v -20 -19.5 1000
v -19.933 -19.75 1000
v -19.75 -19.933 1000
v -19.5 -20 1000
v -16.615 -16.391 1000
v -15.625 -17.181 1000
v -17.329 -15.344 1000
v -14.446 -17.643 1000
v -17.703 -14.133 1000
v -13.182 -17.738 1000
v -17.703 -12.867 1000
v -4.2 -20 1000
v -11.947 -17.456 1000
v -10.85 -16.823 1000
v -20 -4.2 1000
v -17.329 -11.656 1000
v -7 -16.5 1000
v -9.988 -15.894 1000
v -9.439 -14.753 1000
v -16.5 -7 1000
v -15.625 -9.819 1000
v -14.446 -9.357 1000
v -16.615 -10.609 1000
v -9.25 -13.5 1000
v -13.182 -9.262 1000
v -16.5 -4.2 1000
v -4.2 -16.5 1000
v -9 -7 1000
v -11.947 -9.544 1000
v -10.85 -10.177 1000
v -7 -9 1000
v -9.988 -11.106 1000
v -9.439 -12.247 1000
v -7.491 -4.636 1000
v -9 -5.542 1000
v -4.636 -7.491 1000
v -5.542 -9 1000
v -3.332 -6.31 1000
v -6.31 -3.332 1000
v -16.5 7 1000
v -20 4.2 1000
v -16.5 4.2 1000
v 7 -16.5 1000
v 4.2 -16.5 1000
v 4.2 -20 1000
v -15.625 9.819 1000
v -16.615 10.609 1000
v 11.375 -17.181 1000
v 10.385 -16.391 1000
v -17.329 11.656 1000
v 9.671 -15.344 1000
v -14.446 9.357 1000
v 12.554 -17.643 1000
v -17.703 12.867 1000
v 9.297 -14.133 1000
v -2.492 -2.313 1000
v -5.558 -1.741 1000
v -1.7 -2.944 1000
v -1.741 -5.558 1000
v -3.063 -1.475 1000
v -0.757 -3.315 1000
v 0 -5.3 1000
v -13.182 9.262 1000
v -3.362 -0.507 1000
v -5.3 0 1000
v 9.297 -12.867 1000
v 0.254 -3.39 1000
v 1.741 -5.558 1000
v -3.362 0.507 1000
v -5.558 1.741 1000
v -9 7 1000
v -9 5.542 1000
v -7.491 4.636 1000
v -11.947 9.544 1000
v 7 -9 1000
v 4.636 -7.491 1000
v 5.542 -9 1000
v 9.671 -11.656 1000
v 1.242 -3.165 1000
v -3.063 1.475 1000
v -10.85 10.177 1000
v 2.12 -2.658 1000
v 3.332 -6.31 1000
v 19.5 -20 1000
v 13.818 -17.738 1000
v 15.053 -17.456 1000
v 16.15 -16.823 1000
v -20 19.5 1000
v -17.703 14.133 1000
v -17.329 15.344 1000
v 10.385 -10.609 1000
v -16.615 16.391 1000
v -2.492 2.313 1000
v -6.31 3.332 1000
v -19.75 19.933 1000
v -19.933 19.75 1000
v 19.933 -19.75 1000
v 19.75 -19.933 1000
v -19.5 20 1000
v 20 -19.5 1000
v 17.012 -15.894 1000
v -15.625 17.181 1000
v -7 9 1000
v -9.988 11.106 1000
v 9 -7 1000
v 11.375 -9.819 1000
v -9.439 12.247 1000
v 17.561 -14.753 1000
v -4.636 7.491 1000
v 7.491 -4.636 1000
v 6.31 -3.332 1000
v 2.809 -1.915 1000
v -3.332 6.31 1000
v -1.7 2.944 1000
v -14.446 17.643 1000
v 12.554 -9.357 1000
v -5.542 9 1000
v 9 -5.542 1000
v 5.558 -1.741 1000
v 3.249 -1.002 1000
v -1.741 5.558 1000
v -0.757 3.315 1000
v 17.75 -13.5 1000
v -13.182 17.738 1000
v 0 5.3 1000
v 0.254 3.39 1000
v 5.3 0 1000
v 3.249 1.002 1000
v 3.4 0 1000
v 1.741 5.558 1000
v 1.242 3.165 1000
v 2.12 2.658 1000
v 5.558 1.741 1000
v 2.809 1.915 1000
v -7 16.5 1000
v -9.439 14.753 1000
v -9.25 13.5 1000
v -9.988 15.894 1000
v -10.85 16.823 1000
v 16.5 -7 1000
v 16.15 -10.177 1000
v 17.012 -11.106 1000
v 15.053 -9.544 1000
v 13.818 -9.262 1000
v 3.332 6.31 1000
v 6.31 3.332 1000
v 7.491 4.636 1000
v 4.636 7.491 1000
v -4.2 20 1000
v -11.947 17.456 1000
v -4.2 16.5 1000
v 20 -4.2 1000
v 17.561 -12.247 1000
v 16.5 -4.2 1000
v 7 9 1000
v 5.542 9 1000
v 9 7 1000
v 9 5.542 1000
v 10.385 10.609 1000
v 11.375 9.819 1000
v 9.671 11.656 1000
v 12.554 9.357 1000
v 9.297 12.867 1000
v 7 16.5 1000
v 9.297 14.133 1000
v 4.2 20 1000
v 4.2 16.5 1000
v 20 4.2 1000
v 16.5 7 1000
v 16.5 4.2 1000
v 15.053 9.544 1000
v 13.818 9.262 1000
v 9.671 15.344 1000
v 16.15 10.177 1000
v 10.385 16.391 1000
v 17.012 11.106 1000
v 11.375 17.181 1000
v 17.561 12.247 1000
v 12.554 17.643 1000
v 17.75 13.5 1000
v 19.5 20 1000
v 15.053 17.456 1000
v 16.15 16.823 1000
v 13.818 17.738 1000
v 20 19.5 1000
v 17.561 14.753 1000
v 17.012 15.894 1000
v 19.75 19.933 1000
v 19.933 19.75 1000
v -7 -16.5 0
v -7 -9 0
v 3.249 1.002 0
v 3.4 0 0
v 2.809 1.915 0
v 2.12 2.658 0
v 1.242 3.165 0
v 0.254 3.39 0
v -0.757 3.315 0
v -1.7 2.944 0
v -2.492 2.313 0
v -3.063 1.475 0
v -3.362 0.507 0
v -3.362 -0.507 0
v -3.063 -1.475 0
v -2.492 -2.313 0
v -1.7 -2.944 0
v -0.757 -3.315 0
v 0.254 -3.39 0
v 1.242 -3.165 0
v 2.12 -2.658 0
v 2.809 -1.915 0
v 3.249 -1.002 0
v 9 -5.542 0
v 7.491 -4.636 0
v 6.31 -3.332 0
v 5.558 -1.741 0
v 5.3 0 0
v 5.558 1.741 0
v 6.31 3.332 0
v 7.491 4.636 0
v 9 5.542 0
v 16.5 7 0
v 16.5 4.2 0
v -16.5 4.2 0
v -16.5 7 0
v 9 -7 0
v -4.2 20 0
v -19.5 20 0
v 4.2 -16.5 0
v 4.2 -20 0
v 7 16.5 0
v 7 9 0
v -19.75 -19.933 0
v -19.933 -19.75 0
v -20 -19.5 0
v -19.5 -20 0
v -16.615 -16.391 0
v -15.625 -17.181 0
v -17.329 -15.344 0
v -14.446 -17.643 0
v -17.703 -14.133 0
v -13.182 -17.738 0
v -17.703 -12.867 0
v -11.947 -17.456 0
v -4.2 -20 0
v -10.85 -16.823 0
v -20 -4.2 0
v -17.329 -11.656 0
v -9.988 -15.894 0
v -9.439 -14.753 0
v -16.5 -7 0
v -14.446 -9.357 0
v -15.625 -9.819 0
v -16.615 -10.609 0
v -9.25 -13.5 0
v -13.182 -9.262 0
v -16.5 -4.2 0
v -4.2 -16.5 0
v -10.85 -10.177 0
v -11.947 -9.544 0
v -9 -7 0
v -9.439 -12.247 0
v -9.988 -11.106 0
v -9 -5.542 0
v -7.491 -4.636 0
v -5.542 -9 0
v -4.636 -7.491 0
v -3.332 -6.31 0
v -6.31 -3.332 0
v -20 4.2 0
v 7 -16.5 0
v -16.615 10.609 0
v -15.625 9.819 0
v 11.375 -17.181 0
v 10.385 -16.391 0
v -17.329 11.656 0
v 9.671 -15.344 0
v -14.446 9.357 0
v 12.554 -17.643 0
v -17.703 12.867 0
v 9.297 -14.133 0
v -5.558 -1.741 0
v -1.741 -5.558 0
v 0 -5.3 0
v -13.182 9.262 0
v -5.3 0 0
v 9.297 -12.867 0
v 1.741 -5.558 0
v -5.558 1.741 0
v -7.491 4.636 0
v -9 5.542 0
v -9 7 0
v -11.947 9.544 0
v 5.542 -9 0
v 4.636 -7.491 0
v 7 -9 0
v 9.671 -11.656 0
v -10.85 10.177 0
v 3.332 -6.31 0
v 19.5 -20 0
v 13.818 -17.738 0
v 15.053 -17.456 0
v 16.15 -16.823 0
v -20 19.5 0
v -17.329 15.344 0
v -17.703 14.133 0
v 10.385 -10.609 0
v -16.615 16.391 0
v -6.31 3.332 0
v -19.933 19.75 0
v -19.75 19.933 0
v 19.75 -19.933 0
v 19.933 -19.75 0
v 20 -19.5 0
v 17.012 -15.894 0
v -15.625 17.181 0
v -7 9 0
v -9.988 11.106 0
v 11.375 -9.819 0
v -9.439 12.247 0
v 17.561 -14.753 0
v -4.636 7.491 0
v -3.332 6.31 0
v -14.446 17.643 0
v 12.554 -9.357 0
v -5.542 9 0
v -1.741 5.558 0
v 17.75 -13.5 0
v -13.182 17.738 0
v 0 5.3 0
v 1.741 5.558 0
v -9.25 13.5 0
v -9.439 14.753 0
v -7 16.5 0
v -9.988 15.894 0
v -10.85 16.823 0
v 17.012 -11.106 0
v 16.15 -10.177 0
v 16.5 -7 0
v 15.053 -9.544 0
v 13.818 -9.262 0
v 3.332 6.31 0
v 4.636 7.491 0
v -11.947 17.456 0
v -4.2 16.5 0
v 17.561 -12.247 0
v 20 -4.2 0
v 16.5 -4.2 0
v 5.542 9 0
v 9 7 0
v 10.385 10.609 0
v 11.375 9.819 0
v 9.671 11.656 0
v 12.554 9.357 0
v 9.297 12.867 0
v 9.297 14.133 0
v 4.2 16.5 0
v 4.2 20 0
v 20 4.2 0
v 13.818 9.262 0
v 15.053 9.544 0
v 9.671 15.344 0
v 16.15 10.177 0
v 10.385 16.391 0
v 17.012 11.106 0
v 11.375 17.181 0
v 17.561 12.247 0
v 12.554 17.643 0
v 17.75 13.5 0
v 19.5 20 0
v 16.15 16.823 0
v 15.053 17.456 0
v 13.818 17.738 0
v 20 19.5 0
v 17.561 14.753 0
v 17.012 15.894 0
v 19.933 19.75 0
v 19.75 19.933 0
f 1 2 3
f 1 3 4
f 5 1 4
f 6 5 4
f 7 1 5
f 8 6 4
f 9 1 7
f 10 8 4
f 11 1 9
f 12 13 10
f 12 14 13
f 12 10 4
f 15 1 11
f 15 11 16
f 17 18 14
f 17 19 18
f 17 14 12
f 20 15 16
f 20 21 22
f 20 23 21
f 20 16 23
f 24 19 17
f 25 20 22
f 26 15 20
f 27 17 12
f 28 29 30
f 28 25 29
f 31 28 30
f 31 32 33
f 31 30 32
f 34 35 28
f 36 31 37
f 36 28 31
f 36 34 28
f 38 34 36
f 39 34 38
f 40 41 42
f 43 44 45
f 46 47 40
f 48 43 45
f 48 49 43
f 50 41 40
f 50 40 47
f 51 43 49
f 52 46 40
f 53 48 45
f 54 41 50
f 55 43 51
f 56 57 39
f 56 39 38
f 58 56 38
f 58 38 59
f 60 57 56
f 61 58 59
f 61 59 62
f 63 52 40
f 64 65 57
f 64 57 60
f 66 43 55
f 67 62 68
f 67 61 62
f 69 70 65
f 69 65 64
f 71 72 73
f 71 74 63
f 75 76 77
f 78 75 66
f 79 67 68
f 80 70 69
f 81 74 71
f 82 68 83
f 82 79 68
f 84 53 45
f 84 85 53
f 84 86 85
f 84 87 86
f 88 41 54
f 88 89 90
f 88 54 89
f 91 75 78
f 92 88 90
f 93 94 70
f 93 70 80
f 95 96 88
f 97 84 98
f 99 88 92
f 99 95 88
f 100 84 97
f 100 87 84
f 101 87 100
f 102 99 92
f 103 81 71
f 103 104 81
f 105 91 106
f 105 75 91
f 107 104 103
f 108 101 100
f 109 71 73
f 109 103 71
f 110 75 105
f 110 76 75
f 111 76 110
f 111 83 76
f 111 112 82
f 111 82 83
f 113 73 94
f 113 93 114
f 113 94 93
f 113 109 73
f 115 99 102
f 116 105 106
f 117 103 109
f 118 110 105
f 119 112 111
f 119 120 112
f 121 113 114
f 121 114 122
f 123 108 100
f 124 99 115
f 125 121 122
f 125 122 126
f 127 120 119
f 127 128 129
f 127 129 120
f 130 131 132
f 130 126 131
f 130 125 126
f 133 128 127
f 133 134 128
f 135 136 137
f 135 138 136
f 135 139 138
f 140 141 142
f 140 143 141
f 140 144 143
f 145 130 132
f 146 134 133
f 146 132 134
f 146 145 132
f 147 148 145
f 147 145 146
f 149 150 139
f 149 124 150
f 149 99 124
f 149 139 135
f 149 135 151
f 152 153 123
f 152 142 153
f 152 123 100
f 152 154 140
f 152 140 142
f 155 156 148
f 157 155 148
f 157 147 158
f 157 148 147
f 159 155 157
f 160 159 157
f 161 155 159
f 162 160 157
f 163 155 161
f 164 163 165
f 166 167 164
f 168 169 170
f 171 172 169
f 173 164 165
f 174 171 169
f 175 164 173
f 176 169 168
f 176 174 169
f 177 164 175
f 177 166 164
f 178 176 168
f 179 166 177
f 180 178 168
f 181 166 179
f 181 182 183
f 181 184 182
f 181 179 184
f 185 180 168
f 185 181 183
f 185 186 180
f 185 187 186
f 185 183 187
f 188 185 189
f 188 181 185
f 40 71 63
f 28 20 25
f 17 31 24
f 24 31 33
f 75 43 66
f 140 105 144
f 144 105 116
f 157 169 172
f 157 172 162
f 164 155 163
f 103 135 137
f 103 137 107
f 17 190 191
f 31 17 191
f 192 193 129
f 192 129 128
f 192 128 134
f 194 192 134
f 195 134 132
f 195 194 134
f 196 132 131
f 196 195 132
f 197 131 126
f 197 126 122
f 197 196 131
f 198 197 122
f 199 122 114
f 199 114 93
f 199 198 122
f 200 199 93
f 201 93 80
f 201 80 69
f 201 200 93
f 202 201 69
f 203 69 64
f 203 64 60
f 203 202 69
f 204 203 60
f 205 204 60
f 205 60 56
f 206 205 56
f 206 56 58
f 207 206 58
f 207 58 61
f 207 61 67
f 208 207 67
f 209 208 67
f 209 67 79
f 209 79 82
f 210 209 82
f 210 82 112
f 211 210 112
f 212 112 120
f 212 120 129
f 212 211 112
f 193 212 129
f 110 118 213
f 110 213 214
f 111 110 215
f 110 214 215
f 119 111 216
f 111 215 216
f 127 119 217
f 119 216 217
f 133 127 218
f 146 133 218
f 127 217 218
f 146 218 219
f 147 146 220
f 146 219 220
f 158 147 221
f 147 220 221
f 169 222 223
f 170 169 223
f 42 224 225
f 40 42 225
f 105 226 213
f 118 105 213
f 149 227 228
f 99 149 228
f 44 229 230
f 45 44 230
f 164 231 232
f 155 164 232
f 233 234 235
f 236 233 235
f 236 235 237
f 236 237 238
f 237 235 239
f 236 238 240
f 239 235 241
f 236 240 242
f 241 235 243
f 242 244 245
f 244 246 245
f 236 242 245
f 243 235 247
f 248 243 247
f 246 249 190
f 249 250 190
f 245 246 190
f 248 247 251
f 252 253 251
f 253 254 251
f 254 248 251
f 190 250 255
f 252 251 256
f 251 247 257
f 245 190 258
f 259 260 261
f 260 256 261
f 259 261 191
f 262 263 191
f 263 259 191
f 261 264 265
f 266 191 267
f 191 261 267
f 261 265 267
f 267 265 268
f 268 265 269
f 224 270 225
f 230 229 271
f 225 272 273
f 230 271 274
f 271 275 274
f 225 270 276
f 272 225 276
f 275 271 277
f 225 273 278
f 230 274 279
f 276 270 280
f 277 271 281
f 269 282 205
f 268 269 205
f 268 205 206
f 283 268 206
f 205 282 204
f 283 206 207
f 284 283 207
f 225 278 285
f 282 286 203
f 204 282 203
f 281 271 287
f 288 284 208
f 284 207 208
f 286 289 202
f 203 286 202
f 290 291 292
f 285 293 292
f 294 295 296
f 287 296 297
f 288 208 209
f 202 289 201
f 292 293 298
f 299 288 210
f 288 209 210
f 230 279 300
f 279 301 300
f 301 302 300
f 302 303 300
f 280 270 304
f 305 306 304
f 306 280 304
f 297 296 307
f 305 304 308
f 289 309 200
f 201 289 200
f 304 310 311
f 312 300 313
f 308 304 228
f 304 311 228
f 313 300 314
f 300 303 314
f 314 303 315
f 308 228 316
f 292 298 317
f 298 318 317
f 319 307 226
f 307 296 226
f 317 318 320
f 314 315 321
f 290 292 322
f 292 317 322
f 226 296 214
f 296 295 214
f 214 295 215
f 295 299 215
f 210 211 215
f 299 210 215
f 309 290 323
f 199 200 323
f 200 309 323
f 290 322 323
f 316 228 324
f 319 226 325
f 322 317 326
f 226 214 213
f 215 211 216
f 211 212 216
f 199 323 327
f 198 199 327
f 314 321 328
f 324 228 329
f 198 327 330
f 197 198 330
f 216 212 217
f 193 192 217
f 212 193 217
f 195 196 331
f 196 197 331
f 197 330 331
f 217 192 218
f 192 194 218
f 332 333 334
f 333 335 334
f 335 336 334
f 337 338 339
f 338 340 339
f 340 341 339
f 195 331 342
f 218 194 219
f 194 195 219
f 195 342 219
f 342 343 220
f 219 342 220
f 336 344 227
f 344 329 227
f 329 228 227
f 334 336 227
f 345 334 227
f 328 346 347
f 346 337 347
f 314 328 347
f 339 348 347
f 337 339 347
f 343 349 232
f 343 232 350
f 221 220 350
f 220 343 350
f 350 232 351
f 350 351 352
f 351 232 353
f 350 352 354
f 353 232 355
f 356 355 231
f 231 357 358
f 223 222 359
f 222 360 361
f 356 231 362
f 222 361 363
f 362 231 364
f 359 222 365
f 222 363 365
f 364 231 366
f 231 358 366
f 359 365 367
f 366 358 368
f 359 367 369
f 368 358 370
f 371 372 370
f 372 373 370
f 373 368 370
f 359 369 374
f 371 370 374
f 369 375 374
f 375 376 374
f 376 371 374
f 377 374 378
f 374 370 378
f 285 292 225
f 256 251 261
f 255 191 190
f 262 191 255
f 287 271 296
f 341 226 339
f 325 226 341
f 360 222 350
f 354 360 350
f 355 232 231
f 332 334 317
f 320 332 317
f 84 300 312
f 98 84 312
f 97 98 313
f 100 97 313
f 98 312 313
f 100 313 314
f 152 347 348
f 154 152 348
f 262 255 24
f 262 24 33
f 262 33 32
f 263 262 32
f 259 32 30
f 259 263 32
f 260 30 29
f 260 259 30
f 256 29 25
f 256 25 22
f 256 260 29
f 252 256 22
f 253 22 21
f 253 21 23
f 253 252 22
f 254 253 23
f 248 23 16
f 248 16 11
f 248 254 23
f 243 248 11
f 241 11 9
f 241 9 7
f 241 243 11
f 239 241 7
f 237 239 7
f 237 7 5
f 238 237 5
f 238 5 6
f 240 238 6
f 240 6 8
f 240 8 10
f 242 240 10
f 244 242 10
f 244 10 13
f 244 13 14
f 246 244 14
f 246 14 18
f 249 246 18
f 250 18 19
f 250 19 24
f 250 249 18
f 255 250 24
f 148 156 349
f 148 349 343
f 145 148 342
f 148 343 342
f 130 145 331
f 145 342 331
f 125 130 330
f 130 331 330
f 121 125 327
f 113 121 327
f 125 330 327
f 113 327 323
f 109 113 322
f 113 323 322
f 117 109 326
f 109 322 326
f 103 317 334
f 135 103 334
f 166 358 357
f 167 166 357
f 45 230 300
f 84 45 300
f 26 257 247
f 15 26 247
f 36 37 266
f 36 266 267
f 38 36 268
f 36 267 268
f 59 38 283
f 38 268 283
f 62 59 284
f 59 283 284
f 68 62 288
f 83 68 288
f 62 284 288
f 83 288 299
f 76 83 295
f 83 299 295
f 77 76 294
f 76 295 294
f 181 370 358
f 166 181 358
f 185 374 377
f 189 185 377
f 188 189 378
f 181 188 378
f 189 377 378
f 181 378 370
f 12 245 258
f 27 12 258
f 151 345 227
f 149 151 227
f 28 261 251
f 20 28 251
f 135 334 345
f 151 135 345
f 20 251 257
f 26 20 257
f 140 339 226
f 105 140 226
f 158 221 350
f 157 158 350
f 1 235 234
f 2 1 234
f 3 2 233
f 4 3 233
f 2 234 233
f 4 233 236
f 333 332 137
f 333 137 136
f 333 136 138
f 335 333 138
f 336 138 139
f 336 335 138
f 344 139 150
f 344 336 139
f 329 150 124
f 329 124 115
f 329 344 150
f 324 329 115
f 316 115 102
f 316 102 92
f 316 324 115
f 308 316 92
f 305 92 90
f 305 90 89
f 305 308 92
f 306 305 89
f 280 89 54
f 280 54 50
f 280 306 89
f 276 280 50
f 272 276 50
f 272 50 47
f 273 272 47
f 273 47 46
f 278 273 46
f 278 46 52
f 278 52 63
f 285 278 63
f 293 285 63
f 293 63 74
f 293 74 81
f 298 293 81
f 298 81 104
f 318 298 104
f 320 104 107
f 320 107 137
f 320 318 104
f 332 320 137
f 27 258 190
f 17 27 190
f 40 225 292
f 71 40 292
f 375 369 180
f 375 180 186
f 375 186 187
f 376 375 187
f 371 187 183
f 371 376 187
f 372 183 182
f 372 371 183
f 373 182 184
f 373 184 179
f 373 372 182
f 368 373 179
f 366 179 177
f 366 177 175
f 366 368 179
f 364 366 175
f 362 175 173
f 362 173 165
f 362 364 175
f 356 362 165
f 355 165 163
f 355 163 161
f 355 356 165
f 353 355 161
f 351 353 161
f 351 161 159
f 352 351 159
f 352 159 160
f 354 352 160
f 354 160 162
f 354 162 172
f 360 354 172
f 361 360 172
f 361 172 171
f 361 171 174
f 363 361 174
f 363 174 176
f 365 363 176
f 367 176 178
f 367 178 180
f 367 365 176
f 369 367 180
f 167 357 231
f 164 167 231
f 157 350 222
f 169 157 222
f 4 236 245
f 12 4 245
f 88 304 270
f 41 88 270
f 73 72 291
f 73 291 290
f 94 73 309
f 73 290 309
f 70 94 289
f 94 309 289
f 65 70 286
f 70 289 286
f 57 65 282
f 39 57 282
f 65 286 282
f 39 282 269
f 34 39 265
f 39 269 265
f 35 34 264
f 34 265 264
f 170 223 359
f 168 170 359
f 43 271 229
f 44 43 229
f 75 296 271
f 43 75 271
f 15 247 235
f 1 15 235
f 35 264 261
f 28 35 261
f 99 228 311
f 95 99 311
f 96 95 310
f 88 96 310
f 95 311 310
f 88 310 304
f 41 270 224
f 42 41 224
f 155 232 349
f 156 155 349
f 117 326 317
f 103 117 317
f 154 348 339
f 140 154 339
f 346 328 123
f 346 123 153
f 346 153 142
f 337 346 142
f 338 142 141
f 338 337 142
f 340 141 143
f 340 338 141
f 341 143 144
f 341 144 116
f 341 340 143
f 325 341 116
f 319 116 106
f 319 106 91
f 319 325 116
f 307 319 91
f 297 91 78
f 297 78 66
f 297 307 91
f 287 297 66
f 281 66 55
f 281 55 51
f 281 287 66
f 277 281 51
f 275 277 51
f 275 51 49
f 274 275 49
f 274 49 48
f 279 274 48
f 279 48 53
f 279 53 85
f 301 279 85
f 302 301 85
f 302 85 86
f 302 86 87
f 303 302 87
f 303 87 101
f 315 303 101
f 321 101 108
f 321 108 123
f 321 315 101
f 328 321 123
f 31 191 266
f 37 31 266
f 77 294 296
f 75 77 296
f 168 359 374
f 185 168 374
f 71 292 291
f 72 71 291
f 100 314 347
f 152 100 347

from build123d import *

# Parameters (mm, degrees)
SKETCH_1_R      = 4.25
SKETCH_1_R_2    = 3.4
EXTRUDE_1_DEPTH = 1000


with BuildPart() as part:
    # Эскиз1 → Бобышка-Вытянуть1 (new body)
    with BuildSketch(Plane.XY):
        with BuildLine():
            Line((-20, 19.5), (-20, 7))
            Line((-20, 7), (-20, 4.2))
            Line((-20, 4.2), (-16.5, 4.2))
            Line((-16.5, 4.2), (-16.5, 7))
            Line((-16.5, 7), (-9, 7))
            Line((-9, 7), (-9, 5.541660401))
            ThreePointArc((-9, 5.541660401), (-5.3, 0), (-9, -5.541660401))
            Line((-9, -5.541660401), (-9, -7))
            Line((-9, -7), (-16.5, -7))
            Line((-16.5, -7), (-16.5, -4.2))
            Line((-16.5, -4.2), (-20, -4.2))
            Line((-20, -4.2), (-20, -7))
            Line((-20, -7), (-20, -19.5))
            ThreePointArc((-20, -19.5), (-19.853553391, -19.853553391), (-19.5, -20))
            Line((-19.5, -20), (-7, -20))
            Line((-7, -20), (-4.2, -20))
            Line((-4.2, -20), (-4.2, -16.5))
            Line((-4.2, -16.5), (-7, -16.5))
            Line((-7, -16.5), (-7, -9))
            Line((-7, -9), (-5.541660401, -9))
            ThreePointArc((-5.541660401, -9), (0, -5.3), (5.541660401, -9))
            Line((5.541660401, -9), (7, -9))
            Line((7, -9), (7, -16.5))
            Line((7, -16.5), (4.2, -16.5))
            Line((4.2, -16.5), (4.2, -20))
            Line((4.2, -20), (7, -20))
            Line((7, -20), (19.5, -20))
            ThreePointArc((19.5, -20), (19.853553391, -19.853553391), (20, -19.5))
            Line((20, -19.5), (20, -7))
            Line((20, -7), (20, -4.2))
            Line((20, -4.2), (16.5, -4.2))
            Line((16.5, -4.2), (16.5, -7))
            Line((16.5, -7), (9, -7))
            Line((9, -7), (9, -5.541660401))
            ThreePointArc((9, -5.541660401), (5.3, 0), (9, 5.541660401))
            Line((9, 5.541660401), (9, 7))
            Line((9, 7), (16.5, 7))
            Line((16.5, 7), (16.5, 4.2))
            Line((16.5, 4.2), (20, 4.2))
            Line((20, 4.2), (20, 7))
            Line((20, 7), (20, 19.5))
            ThreePointArc((20, 19.5), (19.853553391, 19.853553391), (19.5, 20))
            Line((19.5, 20), (7, 20))
            Line((7, 20), (4.2, 20))
            Line((4.2, 20), (4.2, 16.5))
            Line((4.2, 16.5), (7, 16.5))
            Line((7, 16.5), (7, 9))
            Line((7, 9), (5.541660401, 9))
            ThreePointArc((5.541660401, 9), (0, 5.3), (-5.541660401, 9))
            Line((-5.541660401, 9), (-7, 9))
            Line((-7, 9), (-7, 16.5))
            Line((-7, 16.5), (-4.2, 16.5))
            Line((-4.2, 16.5), (-4.2, 20))
            Line((-4.2, 20), (-7, 20))
            Line((-7, 20), (-19.5, 20))
            ThreePointArc((-19.5, 20), (-19.853553391, 19.853553391), (-20, 19.5))
        make_face()
        with Locations((-13.5, -13.5)):
            Circle(SKETCH_1_R, mode=Mode.SUBTRACT)
        with Locations((13.5, -13.5)):
            Circle(SKETCH_1_R, mode=Mode.SUBTRACT)
        with Locations((-13.5, 13.5)):
            Circle(SKETCH_1_R, mode=Mode.SUBTRACT)
        Circle(SKETCH_1_R_2, mode=Mode.SUBTRACT)
        with Locations((13.5, 13.5)):
            Circle(SKETCH_1_R, mode=Mode.SUBTRACT)
    extrude(amount=EXTRUDE_1_DEPTH)


solid = part.part
